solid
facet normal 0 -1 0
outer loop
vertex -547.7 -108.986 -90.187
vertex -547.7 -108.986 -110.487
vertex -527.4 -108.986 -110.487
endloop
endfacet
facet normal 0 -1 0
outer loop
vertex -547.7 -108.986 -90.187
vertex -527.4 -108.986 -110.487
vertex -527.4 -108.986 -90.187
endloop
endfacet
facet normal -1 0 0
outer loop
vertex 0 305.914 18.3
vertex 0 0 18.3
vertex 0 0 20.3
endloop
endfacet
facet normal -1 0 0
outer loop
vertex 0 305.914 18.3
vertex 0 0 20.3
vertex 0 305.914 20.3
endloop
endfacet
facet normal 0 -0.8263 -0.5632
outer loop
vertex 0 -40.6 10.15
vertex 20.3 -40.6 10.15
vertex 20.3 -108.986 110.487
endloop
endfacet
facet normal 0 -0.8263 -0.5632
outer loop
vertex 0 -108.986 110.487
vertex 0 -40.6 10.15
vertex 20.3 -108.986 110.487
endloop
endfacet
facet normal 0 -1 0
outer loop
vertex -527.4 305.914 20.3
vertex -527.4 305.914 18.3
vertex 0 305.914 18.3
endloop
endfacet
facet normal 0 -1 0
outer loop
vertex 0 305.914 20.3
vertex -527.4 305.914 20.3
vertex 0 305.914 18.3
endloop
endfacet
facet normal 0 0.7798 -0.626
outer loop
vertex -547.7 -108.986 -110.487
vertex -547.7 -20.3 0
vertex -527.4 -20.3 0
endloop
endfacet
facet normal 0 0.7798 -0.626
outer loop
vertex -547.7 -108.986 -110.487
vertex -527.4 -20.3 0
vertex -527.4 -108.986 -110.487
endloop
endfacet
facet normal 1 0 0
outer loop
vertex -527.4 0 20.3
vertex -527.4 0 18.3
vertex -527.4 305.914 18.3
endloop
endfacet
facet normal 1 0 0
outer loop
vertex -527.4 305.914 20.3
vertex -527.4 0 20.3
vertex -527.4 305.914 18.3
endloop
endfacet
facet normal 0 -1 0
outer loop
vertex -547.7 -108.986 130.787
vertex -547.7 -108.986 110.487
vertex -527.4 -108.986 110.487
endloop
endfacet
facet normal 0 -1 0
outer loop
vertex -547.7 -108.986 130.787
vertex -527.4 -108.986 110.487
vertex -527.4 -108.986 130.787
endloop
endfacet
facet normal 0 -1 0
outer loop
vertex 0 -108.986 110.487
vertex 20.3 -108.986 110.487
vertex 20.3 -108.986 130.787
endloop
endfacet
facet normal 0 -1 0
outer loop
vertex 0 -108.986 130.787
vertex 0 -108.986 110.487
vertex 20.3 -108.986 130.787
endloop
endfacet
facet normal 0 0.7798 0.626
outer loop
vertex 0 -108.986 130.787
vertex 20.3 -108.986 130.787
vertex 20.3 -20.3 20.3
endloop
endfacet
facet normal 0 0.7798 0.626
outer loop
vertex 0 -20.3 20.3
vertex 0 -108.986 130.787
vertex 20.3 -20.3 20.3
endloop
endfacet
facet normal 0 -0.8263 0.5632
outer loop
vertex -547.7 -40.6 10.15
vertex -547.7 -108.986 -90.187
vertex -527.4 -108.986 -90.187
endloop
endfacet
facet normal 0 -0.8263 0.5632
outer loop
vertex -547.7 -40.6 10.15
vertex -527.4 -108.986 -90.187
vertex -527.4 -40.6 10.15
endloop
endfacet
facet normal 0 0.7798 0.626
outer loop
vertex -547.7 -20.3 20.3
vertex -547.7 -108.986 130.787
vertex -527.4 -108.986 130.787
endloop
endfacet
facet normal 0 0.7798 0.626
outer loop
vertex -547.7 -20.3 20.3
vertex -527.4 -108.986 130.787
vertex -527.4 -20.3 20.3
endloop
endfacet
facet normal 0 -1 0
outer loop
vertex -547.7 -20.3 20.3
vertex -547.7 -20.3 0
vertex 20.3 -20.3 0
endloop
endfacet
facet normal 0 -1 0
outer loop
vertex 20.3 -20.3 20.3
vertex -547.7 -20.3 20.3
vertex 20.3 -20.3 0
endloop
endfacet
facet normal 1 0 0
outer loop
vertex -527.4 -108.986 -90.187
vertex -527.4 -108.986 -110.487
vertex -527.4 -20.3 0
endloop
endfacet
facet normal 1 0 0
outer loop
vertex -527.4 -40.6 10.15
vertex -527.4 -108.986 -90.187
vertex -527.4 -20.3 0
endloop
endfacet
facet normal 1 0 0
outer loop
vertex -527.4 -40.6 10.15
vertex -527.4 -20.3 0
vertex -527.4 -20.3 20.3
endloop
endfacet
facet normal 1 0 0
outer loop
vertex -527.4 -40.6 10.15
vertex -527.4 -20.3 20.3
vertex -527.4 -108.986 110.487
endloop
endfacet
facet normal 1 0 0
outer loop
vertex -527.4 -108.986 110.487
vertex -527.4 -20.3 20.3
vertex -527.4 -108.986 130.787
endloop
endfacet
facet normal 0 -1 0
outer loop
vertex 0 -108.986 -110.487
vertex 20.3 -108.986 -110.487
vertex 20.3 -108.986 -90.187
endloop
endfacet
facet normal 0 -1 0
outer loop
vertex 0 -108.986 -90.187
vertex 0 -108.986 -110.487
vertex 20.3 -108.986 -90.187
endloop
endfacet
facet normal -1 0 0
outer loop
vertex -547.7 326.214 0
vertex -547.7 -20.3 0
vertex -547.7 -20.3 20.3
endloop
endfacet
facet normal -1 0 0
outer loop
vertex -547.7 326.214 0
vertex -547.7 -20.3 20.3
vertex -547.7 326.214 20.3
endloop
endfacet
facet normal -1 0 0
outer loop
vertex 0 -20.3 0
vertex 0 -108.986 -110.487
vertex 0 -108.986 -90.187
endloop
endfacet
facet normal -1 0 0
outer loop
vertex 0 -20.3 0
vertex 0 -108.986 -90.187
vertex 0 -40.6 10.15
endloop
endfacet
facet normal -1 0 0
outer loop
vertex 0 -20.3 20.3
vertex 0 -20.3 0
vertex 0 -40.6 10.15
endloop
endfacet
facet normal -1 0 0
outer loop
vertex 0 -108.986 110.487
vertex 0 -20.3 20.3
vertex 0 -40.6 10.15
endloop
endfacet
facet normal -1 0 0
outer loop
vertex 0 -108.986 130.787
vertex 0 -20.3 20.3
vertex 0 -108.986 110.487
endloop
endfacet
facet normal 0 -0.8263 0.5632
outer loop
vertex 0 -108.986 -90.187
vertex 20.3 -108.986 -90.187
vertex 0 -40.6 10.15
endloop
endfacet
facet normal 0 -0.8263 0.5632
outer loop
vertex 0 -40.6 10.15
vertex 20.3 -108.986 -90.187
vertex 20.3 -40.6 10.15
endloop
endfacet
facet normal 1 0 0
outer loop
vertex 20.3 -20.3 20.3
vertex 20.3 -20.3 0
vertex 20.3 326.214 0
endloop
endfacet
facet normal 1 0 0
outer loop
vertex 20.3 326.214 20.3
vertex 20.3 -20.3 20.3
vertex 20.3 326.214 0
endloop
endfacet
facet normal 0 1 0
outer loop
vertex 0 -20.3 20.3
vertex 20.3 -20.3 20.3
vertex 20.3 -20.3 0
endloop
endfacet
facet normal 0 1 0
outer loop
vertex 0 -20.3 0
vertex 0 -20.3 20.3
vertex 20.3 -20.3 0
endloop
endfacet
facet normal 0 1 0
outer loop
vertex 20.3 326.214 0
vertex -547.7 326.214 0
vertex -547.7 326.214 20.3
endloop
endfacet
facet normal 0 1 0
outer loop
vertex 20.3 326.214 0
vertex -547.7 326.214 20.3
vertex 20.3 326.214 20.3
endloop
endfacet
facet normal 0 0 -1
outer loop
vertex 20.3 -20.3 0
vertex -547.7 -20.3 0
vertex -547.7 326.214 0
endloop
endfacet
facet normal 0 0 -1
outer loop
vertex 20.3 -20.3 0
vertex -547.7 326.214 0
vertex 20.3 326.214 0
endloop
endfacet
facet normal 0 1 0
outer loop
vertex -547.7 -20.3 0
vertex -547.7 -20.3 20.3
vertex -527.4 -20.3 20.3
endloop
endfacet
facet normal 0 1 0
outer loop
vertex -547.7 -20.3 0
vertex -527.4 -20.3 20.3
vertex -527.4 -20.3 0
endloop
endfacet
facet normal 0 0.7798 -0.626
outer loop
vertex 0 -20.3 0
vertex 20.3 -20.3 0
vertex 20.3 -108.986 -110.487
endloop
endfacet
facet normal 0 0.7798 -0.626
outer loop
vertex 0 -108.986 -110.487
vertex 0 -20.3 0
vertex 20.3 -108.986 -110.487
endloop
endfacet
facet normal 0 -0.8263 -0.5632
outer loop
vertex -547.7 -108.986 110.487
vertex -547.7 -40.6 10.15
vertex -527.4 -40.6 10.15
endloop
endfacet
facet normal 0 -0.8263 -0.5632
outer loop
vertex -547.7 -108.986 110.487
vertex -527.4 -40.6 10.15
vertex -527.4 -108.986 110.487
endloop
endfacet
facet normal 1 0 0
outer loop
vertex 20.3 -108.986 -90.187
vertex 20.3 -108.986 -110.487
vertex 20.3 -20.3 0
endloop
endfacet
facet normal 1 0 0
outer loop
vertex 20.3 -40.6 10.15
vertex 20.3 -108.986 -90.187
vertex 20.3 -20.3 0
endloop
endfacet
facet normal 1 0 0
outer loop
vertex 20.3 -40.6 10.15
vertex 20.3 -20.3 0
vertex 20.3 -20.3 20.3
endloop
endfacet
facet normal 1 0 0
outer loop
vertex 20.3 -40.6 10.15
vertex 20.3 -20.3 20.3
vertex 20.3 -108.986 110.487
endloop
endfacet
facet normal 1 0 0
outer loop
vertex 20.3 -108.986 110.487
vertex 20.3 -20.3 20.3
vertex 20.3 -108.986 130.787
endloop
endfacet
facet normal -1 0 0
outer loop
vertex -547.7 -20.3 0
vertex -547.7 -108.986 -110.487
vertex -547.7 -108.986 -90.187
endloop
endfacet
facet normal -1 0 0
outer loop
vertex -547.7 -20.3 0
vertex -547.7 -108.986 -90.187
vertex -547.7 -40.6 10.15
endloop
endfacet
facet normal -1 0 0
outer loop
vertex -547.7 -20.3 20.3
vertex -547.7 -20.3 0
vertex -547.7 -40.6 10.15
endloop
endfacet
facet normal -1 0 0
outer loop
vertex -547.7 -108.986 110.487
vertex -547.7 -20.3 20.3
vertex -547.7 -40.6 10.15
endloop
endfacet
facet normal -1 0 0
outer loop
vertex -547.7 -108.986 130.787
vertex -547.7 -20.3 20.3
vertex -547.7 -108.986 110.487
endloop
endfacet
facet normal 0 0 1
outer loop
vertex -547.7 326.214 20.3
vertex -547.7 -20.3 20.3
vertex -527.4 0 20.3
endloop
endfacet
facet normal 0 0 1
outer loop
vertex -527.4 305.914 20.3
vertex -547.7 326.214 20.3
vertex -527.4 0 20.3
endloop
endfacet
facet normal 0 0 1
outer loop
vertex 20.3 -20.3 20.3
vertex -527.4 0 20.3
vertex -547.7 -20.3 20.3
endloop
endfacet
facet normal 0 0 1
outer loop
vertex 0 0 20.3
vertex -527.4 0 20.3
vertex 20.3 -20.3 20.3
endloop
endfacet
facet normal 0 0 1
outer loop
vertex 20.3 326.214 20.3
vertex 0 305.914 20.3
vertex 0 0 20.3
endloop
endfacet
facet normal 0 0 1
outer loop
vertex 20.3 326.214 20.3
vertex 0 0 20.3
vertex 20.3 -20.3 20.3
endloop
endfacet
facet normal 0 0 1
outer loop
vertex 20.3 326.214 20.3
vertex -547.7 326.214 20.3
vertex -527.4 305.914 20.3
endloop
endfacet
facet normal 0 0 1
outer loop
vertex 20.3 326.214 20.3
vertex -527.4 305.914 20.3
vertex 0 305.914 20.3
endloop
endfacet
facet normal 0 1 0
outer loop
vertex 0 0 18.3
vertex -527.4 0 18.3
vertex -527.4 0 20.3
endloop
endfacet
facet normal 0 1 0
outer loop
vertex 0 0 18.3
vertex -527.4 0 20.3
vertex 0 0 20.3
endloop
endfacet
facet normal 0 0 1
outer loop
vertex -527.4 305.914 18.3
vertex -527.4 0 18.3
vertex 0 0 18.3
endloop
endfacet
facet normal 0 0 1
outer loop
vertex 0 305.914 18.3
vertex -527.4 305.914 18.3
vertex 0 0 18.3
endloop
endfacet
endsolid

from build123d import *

# Parameters (mm, degrees)
ESQUISSE1_W        = 568
ESQUISSE1_H        = 346.513925803
ESQUISSE1_W_2      = 527.4
ESQUISSE1_H_2      = 305.913925803
BOSS_EXTRU_1_DEPTH = 20.3
BOSS_EXTRU_2_REACH = 328.214
ESQUISSE2_W        = 527.4
ESQUISSE2_H        = 18.3
BOSS_EXTRU_3_DEPTH = 20.3


with BuildPart() as part:
    # Esquisse1 → Boss.-Extru.1 (new body)
    with BuildSketch(Plane.XY):
        with Locations((-263.7, 152.956962901)):
            Rectangle(ESQUISSE1_W, ESQUISSE1_H)
        with Locations((-263.7, 152.956962902)):
            Rectangle(ESQUISSE1_W_2, ESQUISSE1_H_2, mode=Mode.SUBTRACT)
    extrude(amount=BOSS_EXTRU_1_DEPTH)

    # Esquisse2 → Boss.-Extru.2 (add, up to next)
    with BuildSketch(Plane(origin=(0, 0, 0), x_dir=(1, 0, 0), z_dir=(0, 1, 0)), mode=Mode.PRIVATE) as boss_extru_2_sk1:
        with Locations((-263.7, -9.15)):
            Rectangle(ESQUISSE2_W, ESQUISSE2_H)
    boss_extru_2_tool1 = extrude(boss_extru_2_sk1.sketch, amount=BOSS_EXTRU_2_REACH, mode=Mode.PRIVATE) - part.part
    add(boss_extru_2_tool1.solids().sort_by_distance((-263.7, 0, 9.15))[0])


with BuildPart() as body_2:
    # Esquisse3 → Boss.-Extru.3 (new body)
    with BuildSketch(Plane.ZY.offset(547.7)):
        Polygon((10.15, -40.6), (10.15, -20.3), (0, -20.3), (-110.486746728, -108.986074197), (-90.186746728, -108.986074197), align=None)
        Polygon((20.3, -20.3), (10.15, -20.3), (10.15, -40.6), (110.486746728, -108.986074197), (130.786746728, -108.986074197), align=None)
    extrude(amount=-BOSS_EXTRU_3_DEPTH)


with BuildPart() as body_3:
    # Symétrie2: mirrored copy
    add(body_2.part.mirror(Plane.ZY.offset(263.7)))


solid = Compound([part.part, body_2.part, body_3.part])
